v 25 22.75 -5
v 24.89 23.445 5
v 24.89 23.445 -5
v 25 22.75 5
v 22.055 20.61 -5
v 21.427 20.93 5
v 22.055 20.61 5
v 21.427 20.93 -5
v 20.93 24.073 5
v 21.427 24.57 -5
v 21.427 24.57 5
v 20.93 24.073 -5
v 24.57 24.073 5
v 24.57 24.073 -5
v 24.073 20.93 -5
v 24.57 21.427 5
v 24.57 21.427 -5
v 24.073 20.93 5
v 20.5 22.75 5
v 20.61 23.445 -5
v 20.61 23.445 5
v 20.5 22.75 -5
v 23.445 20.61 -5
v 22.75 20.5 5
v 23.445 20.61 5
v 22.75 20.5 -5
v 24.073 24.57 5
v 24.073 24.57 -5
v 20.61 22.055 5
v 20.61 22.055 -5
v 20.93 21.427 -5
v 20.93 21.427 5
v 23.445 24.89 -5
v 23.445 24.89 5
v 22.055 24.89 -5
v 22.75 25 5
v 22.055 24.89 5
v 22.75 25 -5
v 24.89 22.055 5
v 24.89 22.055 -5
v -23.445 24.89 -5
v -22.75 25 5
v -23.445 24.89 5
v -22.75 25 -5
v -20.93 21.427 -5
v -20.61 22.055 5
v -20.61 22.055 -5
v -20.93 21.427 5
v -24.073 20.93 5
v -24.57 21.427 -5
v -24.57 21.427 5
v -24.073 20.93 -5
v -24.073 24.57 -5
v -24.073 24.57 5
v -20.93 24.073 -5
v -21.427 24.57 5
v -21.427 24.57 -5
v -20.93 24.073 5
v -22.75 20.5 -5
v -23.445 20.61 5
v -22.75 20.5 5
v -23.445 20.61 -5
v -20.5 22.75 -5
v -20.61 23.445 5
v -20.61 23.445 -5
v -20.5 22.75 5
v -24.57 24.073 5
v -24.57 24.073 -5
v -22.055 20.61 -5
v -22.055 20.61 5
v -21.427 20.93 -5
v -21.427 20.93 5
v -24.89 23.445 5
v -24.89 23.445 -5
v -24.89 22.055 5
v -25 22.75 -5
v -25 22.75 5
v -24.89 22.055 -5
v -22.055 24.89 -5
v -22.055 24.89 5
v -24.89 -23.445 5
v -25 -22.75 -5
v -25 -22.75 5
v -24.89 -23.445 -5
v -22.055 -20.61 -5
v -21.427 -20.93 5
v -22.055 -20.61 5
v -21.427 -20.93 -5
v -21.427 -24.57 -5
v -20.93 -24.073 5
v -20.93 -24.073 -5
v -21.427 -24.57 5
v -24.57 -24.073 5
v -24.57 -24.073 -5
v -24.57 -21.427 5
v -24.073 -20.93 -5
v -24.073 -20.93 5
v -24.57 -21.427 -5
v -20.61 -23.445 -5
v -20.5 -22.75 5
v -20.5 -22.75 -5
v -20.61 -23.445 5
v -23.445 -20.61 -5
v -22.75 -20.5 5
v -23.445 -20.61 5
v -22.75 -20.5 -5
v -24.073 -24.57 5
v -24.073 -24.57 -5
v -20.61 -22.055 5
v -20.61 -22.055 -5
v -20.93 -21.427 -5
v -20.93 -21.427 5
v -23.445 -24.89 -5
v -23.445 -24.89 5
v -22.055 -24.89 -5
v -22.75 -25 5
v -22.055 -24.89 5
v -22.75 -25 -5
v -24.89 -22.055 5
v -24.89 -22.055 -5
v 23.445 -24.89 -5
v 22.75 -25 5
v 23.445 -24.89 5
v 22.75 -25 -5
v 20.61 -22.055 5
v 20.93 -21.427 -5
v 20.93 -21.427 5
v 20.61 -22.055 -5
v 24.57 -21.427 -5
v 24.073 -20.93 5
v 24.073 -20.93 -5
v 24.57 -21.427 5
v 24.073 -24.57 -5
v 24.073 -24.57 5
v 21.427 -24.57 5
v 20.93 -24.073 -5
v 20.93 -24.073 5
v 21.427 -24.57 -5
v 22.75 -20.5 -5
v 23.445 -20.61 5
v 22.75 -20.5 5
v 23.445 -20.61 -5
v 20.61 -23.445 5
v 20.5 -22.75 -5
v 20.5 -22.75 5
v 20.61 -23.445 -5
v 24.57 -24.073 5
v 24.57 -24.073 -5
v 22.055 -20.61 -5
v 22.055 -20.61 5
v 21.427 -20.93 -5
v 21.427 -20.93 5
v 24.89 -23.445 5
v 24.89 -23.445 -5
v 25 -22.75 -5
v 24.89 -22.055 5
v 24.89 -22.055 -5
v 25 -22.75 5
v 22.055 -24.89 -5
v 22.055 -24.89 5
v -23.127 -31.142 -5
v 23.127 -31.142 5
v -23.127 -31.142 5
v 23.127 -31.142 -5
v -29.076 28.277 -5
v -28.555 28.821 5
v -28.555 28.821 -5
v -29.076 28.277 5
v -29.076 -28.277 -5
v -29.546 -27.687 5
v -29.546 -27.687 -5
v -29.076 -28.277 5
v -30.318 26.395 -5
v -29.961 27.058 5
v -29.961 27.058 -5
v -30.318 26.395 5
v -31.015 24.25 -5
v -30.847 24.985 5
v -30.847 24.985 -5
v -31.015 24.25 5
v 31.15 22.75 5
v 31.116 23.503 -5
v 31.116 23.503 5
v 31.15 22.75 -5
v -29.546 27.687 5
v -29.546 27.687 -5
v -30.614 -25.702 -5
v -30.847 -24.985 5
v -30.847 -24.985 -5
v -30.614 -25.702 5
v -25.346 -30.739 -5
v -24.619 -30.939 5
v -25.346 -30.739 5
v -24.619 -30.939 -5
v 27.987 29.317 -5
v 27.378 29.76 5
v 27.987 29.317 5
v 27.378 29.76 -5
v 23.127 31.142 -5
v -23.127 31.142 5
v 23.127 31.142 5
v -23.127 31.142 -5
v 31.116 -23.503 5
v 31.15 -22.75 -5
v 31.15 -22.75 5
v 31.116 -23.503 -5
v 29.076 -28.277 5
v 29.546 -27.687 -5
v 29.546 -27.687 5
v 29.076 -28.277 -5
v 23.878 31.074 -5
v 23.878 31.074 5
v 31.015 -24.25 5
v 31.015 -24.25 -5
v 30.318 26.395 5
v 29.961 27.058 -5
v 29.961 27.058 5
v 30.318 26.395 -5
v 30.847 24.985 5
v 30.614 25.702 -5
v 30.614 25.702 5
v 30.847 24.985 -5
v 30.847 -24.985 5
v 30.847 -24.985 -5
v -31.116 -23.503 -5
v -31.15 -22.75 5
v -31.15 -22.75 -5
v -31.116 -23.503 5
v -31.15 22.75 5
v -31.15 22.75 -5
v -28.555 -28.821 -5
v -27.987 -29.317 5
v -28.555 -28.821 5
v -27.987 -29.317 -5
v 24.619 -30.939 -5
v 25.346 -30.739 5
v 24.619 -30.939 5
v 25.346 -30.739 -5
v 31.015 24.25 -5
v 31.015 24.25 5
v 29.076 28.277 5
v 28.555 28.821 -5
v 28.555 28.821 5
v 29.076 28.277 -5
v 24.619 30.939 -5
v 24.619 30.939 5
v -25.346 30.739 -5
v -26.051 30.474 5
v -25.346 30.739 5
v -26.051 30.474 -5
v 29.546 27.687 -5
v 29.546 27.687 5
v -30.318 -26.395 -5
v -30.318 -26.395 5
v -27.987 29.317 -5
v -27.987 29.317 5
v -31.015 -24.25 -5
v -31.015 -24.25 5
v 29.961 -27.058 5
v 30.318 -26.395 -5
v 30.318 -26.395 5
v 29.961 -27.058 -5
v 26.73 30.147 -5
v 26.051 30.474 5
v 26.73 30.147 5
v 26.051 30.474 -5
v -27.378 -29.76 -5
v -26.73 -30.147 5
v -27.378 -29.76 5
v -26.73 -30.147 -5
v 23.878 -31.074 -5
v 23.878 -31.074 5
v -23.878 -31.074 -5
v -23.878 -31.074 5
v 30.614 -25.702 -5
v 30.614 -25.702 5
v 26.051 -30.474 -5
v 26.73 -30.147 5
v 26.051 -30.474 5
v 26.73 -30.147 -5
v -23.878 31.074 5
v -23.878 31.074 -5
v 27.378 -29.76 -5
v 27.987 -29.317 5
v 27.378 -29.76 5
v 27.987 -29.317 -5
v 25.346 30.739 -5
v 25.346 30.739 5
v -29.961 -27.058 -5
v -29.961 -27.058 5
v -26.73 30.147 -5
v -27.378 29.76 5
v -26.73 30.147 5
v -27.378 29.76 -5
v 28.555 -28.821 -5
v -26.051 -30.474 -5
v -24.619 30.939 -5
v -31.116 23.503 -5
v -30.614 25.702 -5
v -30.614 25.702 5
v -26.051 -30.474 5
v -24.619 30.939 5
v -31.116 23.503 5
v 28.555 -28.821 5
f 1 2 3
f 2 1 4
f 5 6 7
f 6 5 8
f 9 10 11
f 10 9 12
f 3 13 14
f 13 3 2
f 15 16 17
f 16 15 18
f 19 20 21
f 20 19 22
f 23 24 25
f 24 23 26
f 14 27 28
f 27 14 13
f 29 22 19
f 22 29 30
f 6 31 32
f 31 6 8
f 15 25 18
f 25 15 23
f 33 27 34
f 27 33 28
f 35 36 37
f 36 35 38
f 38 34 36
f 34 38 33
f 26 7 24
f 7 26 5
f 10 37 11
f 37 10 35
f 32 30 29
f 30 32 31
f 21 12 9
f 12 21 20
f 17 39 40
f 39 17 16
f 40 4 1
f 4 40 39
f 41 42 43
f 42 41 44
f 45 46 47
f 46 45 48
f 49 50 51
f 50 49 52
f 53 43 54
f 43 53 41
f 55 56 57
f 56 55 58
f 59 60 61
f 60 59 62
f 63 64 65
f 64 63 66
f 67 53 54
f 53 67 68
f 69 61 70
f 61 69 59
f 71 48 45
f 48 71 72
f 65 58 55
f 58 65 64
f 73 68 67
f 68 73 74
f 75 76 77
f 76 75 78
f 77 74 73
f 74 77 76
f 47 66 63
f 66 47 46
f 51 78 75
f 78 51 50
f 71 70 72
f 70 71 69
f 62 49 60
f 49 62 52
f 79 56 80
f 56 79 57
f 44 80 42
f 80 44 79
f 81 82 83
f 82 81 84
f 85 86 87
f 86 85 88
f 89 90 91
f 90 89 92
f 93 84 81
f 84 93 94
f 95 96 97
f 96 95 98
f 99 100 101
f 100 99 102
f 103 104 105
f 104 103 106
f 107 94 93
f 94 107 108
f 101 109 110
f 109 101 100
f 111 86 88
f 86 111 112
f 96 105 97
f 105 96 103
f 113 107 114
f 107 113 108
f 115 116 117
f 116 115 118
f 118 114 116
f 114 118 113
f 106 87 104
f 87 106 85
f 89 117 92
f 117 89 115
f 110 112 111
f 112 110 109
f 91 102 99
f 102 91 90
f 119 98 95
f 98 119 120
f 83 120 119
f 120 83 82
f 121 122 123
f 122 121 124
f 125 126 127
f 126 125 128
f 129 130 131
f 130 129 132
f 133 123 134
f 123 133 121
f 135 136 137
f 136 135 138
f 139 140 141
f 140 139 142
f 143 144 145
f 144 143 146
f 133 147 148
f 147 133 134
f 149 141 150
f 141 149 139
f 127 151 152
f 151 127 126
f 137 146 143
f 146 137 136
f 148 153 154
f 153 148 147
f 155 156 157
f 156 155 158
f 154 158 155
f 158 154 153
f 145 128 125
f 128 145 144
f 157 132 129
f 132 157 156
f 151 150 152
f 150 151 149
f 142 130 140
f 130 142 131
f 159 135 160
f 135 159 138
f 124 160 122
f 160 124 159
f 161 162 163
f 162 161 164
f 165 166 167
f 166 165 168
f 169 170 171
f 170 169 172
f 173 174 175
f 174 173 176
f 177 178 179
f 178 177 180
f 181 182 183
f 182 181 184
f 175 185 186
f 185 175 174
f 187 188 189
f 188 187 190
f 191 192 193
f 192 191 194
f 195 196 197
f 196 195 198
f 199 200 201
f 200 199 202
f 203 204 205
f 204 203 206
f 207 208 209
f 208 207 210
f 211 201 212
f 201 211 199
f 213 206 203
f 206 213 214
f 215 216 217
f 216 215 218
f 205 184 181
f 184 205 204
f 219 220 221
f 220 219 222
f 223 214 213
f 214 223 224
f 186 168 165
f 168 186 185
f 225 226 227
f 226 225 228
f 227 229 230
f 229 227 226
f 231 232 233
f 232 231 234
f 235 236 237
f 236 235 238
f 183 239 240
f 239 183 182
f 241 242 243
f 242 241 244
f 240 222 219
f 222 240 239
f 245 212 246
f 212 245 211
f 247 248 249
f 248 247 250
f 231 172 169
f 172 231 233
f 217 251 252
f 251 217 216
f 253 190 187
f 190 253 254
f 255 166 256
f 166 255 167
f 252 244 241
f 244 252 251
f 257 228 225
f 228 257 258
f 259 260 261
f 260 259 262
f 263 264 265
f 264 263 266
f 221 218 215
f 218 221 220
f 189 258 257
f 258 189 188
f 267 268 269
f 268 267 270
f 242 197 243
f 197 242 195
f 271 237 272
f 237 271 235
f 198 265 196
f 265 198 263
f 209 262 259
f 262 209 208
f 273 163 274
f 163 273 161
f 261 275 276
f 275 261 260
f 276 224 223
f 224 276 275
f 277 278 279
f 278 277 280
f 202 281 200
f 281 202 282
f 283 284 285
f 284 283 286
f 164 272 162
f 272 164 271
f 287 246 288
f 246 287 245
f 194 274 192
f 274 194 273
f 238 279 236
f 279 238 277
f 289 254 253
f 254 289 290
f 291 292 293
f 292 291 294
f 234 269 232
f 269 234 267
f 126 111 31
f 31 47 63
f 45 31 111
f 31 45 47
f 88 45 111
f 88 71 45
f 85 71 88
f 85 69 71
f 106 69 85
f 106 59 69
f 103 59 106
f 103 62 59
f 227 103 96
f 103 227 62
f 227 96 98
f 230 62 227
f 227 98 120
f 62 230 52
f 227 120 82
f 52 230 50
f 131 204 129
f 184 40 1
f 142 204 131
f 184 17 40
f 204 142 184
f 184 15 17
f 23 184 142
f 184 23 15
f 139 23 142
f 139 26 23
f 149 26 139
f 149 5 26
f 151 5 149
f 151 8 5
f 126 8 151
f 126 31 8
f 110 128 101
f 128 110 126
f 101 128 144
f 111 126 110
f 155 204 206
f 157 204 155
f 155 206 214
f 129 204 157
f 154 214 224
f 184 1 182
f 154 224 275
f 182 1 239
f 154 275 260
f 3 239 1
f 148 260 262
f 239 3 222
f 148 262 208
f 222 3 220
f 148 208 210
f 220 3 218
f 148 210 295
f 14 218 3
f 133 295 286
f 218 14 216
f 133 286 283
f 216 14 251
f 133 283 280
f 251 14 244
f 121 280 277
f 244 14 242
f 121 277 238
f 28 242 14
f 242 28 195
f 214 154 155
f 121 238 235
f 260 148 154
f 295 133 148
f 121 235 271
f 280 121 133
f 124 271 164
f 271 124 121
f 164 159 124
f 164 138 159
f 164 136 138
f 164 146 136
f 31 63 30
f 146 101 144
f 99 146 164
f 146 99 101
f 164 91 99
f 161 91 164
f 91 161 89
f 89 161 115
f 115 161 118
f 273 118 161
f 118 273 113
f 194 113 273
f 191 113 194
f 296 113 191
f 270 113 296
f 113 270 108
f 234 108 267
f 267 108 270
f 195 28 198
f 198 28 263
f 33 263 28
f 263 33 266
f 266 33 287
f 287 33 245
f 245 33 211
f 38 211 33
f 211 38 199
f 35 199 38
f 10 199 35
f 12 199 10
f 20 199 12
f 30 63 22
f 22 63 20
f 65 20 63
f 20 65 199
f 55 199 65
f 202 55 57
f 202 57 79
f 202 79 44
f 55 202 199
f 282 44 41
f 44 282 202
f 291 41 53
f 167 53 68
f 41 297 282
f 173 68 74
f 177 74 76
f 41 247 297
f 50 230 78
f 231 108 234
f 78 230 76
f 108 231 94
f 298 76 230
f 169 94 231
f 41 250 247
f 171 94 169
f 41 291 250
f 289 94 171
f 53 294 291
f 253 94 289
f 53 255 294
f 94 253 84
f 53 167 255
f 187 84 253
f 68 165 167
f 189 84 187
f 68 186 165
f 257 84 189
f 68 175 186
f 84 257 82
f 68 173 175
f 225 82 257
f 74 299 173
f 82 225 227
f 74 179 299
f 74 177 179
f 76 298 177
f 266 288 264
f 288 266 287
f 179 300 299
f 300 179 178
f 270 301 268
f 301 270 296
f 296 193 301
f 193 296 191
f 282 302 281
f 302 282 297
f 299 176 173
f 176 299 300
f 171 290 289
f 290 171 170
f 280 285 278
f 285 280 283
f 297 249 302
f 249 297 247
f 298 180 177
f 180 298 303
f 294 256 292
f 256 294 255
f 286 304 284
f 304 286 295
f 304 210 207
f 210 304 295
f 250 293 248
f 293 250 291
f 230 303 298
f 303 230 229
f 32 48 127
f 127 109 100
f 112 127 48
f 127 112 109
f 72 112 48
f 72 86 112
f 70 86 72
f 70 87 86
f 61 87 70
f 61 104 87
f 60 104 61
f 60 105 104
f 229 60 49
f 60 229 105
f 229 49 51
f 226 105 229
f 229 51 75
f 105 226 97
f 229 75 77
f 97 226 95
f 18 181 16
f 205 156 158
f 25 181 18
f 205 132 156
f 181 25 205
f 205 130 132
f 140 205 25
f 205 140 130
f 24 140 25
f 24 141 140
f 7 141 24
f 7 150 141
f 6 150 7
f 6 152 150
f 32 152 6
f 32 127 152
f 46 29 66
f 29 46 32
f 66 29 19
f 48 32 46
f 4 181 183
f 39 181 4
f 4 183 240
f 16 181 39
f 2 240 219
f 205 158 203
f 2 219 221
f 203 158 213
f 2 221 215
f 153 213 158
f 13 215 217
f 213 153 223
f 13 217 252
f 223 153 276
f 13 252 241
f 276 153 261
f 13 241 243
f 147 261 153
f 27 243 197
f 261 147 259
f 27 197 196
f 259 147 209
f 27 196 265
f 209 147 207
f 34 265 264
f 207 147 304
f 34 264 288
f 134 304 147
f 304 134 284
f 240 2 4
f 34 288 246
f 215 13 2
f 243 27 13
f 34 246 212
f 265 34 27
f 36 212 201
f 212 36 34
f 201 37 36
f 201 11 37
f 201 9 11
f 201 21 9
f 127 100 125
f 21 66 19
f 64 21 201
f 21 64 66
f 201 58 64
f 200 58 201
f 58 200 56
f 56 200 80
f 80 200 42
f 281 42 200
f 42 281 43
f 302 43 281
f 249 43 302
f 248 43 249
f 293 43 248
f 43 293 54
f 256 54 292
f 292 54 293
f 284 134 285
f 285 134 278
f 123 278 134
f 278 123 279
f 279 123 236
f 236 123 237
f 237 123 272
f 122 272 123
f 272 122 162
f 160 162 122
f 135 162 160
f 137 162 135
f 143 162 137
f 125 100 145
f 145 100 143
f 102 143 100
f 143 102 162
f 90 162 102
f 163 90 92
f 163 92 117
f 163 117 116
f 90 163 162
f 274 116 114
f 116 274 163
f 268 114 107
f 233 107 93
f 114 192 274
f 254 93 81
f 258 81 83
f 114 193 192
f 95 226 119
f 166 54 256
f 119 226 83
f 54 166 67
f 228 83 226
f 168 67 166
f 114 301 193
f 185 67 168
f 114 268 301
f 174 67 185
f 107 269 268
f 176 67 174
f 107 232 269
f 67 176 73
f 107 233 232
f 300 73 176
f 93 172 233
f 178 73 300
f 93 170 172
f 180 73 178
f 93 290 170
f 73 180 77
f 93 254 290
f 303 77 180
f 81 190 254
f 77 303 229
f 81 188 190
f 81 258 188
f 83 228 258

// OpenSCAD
// file: ../../parameters.scad
maximum_printable_size = 150;

layer_thickness = 0.3;
global_clearance = 0.5;


//Screw diameter and nut for M10 [mm]
M10_screw_diameter = 10.4;
M10_head_height = 10;
M10_head_diameter = 16+0.5;
M10_nut_height = 10.5;
M10_nut_diameter = 25.5;
M10_nut_pocket = 22.3;

//Screw diameter for M8 [mm]
M8_screw_diameter = 8.6;
M8_head_height = 8;
M8_head_diameter = 13.5;
M8_nut_height = 7.5;
M8_square_nut_thin_height = 4.5;
M8_nut_diameter = 14.4 + 0.5;
M8_nut_pocket = 13 + 0.5;
M8_washer_diameter = 16;
M8_washer_thickness = 1.5;


//Screw diameter and nut for M6 [mm]
M6_screw_diameter=6.5;
M6_head_diameter = 10+0.5;
M6_head_height = 6;
M6_nut_height = 4.9;
M6_nut_diameter = 11.8;
M6_nut_pocket = 10.4;
M6_square_nut_height = 3;
M6_square_nut_diameter = 10;
M6_washer_thickness = 1.6;

//Screw diameter and nut for M5 [mm]
M5_screw_diameter=5.5;
M5_head_height = 5;
M5_head_diameter = 13+0.5;
M5_nut_height = 4.5;
M5_nut_diameter = 9.4;
M5_nut_pocket = 8.4;

//Screw diameter and nut for M4 [mm]
M4_screw_diameter=4.5;
M4_screw_head_height = 4;
M4_nut_height = 3.2;
M4_nut_diameter = 8.4;
M4_nut_pocket = 7.5;

//Screw diameter and nut for M3 [mm]
M3_screw_diameter = 3.2;
M3_nut_height = 2.7;
M3_nut_diameter = 6.6;
M3_nut_pocket = 5.6;
M3_screw_head_height = 3;

//Screw diameter and nut for M2,5 [mm]
M2_5_screw_diameter = 2.7;
M2_5_nut_height = 2.3;
M2_5_nut_diameter = 6;
M2_5_nut_pocket = 5.5;

// kulove lozisko

bearing_efsm_08_h = 33+1;
bearing_efsm_08_m = 22;
bearing_efsm_08_db = 18;
bearing_efsm_08_ag = 10.5;
bearing_efsm_08_n = M4_screw_diameter;
bearing_efsm_08_a1 = 5.5;
bearing_efsm_08_d = 8.25;
bearing_efsm_08_B = 8; // ball height

bearing_efsm_10_h = 38+1;
bearing_efsm_10_m = 26;
bearing_efsm_10_db = 21.9;
bearing_efsm_10_ag = 12+0.2;
bearing_efsm_10_n = M5_screw_diameter;
bearing_efsm_10_a1 = 6.5;
bearing_efsm_10_d = 10.25;


bearing_efsm_12_width = 40+1;
bearing_efsm_12_h = bearing_efsm_12_width;
bearing_efsm_12_boltd = 28/2; // polovina vzdalenosti mezi srouby
bearing_efsm_12_m = bearing_efsm_12_boltd*2;
bearing_efsm_12_db = 25;
bearing_efsm_12_ag = 13;
bearing_efsm_12_a1 = 7;
bearing_efsm_12_n = M5_screw_diameter;
bearing_efsm_12_d = 12.15;
bearing_efsm_12_B = 10; // ball height
bearing_efsm_space = 1;

bearing_efsm_17_width = 54+1;
bearing_efsm_17_h = bearing_efsm_17_width;
bearing_efsm_17_boltd = 38/2; // polovina vzdalenosti mezi srouby
bearing_efsm_17_m = bearing_efsm_17_boltd*2;
bearing_efsm_17_db = 35;
bearing_efsm_17_ag = 18;
bearing_efsm_17_n = M6_screw_diameter;
bearing_efsm_17_a1 = 10;
bearing_efsm_17_B = 17; // ball height

//limcove lozisko
bearing_EFOM_10_L=26; //celkova sirka zakladny
bearing_EFOM_10_d1=10.3;//diametr otvoru real=10 mm
bearing_EFOM_10_dB=22;//diametr vystupku pro ulozeni lozika
bearing_EFOM_10_H=52;//celková delka zakladny
bearing_EFOM_10_J=36;// hole pitch
bearing_EFOM_10_A1=6.5;//vyska pouzdra
bearing_EFOM_10_Ag=12;//celkova vyska
bearing_EFOM_10_N1=5;//sirka otvoru pro sroub
bearing_EFOM_10_N2=8;//delka otvoru pro sroub
bearing_EFOM_10_m=36;//roztec der pro sroub
bearing_EFOM_10_h=9;//vyska lozika


608_bearing_outer_diameter = 22.3;
608_bearing_inner_diameter = 16;
608_bearing_thickness = 7.1;


// 20 KG servo parameters

servo_20kg_axis_offset = 9.375; // jak je osa mimo stredu
servo_20kg_body_x = 42;
servo_20kg_body_y = 21;
servo_20kg_body_z = 40;
servo_20kg_thread_x = 49/2;
servo_20kg_thread_y = 10/2;
servo_20kg_body_below = 10; // jak hluboko je tělo serva pod drzaky na srouby
servo_20kg_below = 25.8; // jak hluboko je páka serva pod drzaky na srouby

servo_20kg_bolt_d = 2.5+0.3;
servo_20kg_nut_d = 5+0.3;


//strain gauge
strain_gauge_width = 12.7;
strain_gauge_length = 75.1;
strain_gauge_screw_distance = 10;

//ALU profile
ALU_profile_width = 30.5;
ALU_profile_holder_wall_thickness = 3;
ALU_profile_groove_width = 8;

//pillow block bearing
//https://www.igus.eu/product/372
//Part no. KSTM-08
KSTM08_screws_distance = 33;         //m
KSTM08_screws_holes_diameter = 4.5;  //d2
KSTM08_flange_thickness = 6;         //h3
KSTM08_case_width = 9;               //C1
KSTM08_case_length = 47;             //a
KSTM08_ball_width = 12;              //B
KSTM08_ball_hole_diameter = 7.85;    //d1


//ložiska pro malý rotor
bearing_outer_diameter = 10.2;    // Rozměr B1 v nákresu s přídavkem na toleranci otvoru
bearing_thickness = 4;        // Rozměr B2 v nákresu
//bearing_shaft_length = 19.5;    // Rozměr B3 v nákresu, Originalni hodnota 19.5
bearing_shaft_length = 20;    // Rozměr B3 v nákresu


//parametry víčka s telemetrickou anténou
S01_sila_materialu=1.2;
S01_vyska_horni_zavit=10;
S01_hloubka_zavitu=4;
S01_prumer_vnitrni=50;
LO_spodni_prumer=17.2;
LO_vyska_bez_krytu=15;
S01_tolerance_zavit=1.5;
R01_vyska_prekryti_statoru=10;

g3_0_cone1 = 70;
g3_0_srcew_dist = 55;



// scale parameters
base_length = 500;
mid_base_width = 500;
mid_base_height = 200;
mid_base_length = 500;
mid_base_x_offset = 50;
base_mid_base_hinge_offset = 50;
tower_height = 185;
tower_angle = atan((mid_base_width/2-ALU_profile_width-10)/tower_height);
tower_arm_length = tower_height/cos(tower_angle);
tower_drag_z_offset = 22;
electro_box_length = 225;
electro_box_width = 165;
electro_box_height = 51.5;

// calibration device parameters
calibration_arm_x_offset = 140;
calibration_arm_y_offset = 50;
// main file
/*
pro díl do kterého se zastrkávají matky z boku
    rotor_joint(1);

pro díl který obsahuje jen díry na šrouby M4
    rotor_joint(2);

pro díl co má díry na matky ze shora
    rotor_joint(3);
*/


include <../../parameters.scad>

module screw_nut_hole(thickness=20) {
    difference() {
        translate([(ALU_profile_width/2+ALU_profile_holder_wall_thickness+M4_screw_diameter), (ALU_profile_width/2+ALU_profile_holder_wall_thickness+M4_screw_diameter), 0])
            cylinder(d=M4_screw_diameter, h=thickness+0.1, center=true, $fn=20);
        translate([(ALU_profile_width/2+ALU_profile_holder_wall_thickness+M4_screw_diameter), (ALU_profile_width/2+ALU_profile_holder_wall_thickness+M4_screw_diameter), thickness/2+.01])
            cylinder(d=M4_screw_diameter, h=1, $fn=20); 
    }

    hull() {
        translate([(ALU_profile_width/2+ALU_profile_holder_wall_thickness+M4_screw_diameter), (ALU_profile_width/2+ALU_profile_holder_wall_thickness+M4_screw_diameter), 0])
            rotate([0, 0, 30])
                cylinder(d=M4_nut_diameter, h=M4_nut_height, $fn=6, center=true);

        translate([(ALU_profile_width/2+ALU_profile_holder_wall_thickness+M4_screw_diameter), (ALU_profile_width/2+ALU_profile_holder_wall_thickness+M4_screw_diameter)+M4_screw_diameter*2, 0])
            cube([M4_nut_pocket, M4_screw_diameter, M4_nut_height], center=true);
    }
}

module rotor_joint(mode, thickness=10) {
    difference() {
        rotor_joint_plate(thickness=thickness);

        rotor_joint_holes(mode=mode, thickness=thickness);
    }
}

module rotor_joint_plate(thickness=10) {
    minkowski() {
            cube([ALU_profile_width+ALU_profile_holder_wall_thickness*2+M4_screw_diameter*2, ALU_profile_width+ALU_profile_holder_wall_thickness*2+M4_screw_diameter*2, thickness/2], center=true);
            cylinder(d=M4_nut_diameter*2, h=thickness/2, $fn=70, center=true);
    }
}

module rotor_joint_holes(mode, thickness=10) {
    if(mode == 1) {
        for(i = [0:90:360]) {
            rotate([0, 0, i])
                screw_nut_hole();
        }
    }
    else if(mode == 2) {
        for(i = [0:90:360])
        rotate([0, 0, i])
        translate([(ALU_profile_width/2+ALU_profile_holder_wall_thickness+M4_screw_diameter), (ALU_profile_width/2+ALU_profile_holder_wall_thickness+M4_screw_diameter), 0]) {
            union() {
                cylinder(d=M4_screw_diameter, h=thickness+0.1, $fn=20, center=true);
                
                translate([0, 0, thickness*2+.01])
                cylinder(d=M4_nut_diameter*2+1, h=30, $fn=100, center=true);
            }
        }
    }
    else if(mode == 3) {
        for(i = [0:90:360]) {
            rotate([0, 0, i])
            translate([(ALU_profile_width/2+ALU_profile_holder_wall_thickness+M4_screw_diameter), (ALU_profile_width/2+ALU_profile_holder_wall_thickness+M4_screw_diameter), 0]) {
                cylinder(d=M4_screw_diameter, h=thickness, $fn=20, center=true);
                translate([0, 0, thickness/2-M4_nut_height+0.1])
                cylinder(d=M4_nut_diameter, h=M4_nut_height+0.1, $fn=6);
            }
        }
    }
}

rotor_joint(2);
